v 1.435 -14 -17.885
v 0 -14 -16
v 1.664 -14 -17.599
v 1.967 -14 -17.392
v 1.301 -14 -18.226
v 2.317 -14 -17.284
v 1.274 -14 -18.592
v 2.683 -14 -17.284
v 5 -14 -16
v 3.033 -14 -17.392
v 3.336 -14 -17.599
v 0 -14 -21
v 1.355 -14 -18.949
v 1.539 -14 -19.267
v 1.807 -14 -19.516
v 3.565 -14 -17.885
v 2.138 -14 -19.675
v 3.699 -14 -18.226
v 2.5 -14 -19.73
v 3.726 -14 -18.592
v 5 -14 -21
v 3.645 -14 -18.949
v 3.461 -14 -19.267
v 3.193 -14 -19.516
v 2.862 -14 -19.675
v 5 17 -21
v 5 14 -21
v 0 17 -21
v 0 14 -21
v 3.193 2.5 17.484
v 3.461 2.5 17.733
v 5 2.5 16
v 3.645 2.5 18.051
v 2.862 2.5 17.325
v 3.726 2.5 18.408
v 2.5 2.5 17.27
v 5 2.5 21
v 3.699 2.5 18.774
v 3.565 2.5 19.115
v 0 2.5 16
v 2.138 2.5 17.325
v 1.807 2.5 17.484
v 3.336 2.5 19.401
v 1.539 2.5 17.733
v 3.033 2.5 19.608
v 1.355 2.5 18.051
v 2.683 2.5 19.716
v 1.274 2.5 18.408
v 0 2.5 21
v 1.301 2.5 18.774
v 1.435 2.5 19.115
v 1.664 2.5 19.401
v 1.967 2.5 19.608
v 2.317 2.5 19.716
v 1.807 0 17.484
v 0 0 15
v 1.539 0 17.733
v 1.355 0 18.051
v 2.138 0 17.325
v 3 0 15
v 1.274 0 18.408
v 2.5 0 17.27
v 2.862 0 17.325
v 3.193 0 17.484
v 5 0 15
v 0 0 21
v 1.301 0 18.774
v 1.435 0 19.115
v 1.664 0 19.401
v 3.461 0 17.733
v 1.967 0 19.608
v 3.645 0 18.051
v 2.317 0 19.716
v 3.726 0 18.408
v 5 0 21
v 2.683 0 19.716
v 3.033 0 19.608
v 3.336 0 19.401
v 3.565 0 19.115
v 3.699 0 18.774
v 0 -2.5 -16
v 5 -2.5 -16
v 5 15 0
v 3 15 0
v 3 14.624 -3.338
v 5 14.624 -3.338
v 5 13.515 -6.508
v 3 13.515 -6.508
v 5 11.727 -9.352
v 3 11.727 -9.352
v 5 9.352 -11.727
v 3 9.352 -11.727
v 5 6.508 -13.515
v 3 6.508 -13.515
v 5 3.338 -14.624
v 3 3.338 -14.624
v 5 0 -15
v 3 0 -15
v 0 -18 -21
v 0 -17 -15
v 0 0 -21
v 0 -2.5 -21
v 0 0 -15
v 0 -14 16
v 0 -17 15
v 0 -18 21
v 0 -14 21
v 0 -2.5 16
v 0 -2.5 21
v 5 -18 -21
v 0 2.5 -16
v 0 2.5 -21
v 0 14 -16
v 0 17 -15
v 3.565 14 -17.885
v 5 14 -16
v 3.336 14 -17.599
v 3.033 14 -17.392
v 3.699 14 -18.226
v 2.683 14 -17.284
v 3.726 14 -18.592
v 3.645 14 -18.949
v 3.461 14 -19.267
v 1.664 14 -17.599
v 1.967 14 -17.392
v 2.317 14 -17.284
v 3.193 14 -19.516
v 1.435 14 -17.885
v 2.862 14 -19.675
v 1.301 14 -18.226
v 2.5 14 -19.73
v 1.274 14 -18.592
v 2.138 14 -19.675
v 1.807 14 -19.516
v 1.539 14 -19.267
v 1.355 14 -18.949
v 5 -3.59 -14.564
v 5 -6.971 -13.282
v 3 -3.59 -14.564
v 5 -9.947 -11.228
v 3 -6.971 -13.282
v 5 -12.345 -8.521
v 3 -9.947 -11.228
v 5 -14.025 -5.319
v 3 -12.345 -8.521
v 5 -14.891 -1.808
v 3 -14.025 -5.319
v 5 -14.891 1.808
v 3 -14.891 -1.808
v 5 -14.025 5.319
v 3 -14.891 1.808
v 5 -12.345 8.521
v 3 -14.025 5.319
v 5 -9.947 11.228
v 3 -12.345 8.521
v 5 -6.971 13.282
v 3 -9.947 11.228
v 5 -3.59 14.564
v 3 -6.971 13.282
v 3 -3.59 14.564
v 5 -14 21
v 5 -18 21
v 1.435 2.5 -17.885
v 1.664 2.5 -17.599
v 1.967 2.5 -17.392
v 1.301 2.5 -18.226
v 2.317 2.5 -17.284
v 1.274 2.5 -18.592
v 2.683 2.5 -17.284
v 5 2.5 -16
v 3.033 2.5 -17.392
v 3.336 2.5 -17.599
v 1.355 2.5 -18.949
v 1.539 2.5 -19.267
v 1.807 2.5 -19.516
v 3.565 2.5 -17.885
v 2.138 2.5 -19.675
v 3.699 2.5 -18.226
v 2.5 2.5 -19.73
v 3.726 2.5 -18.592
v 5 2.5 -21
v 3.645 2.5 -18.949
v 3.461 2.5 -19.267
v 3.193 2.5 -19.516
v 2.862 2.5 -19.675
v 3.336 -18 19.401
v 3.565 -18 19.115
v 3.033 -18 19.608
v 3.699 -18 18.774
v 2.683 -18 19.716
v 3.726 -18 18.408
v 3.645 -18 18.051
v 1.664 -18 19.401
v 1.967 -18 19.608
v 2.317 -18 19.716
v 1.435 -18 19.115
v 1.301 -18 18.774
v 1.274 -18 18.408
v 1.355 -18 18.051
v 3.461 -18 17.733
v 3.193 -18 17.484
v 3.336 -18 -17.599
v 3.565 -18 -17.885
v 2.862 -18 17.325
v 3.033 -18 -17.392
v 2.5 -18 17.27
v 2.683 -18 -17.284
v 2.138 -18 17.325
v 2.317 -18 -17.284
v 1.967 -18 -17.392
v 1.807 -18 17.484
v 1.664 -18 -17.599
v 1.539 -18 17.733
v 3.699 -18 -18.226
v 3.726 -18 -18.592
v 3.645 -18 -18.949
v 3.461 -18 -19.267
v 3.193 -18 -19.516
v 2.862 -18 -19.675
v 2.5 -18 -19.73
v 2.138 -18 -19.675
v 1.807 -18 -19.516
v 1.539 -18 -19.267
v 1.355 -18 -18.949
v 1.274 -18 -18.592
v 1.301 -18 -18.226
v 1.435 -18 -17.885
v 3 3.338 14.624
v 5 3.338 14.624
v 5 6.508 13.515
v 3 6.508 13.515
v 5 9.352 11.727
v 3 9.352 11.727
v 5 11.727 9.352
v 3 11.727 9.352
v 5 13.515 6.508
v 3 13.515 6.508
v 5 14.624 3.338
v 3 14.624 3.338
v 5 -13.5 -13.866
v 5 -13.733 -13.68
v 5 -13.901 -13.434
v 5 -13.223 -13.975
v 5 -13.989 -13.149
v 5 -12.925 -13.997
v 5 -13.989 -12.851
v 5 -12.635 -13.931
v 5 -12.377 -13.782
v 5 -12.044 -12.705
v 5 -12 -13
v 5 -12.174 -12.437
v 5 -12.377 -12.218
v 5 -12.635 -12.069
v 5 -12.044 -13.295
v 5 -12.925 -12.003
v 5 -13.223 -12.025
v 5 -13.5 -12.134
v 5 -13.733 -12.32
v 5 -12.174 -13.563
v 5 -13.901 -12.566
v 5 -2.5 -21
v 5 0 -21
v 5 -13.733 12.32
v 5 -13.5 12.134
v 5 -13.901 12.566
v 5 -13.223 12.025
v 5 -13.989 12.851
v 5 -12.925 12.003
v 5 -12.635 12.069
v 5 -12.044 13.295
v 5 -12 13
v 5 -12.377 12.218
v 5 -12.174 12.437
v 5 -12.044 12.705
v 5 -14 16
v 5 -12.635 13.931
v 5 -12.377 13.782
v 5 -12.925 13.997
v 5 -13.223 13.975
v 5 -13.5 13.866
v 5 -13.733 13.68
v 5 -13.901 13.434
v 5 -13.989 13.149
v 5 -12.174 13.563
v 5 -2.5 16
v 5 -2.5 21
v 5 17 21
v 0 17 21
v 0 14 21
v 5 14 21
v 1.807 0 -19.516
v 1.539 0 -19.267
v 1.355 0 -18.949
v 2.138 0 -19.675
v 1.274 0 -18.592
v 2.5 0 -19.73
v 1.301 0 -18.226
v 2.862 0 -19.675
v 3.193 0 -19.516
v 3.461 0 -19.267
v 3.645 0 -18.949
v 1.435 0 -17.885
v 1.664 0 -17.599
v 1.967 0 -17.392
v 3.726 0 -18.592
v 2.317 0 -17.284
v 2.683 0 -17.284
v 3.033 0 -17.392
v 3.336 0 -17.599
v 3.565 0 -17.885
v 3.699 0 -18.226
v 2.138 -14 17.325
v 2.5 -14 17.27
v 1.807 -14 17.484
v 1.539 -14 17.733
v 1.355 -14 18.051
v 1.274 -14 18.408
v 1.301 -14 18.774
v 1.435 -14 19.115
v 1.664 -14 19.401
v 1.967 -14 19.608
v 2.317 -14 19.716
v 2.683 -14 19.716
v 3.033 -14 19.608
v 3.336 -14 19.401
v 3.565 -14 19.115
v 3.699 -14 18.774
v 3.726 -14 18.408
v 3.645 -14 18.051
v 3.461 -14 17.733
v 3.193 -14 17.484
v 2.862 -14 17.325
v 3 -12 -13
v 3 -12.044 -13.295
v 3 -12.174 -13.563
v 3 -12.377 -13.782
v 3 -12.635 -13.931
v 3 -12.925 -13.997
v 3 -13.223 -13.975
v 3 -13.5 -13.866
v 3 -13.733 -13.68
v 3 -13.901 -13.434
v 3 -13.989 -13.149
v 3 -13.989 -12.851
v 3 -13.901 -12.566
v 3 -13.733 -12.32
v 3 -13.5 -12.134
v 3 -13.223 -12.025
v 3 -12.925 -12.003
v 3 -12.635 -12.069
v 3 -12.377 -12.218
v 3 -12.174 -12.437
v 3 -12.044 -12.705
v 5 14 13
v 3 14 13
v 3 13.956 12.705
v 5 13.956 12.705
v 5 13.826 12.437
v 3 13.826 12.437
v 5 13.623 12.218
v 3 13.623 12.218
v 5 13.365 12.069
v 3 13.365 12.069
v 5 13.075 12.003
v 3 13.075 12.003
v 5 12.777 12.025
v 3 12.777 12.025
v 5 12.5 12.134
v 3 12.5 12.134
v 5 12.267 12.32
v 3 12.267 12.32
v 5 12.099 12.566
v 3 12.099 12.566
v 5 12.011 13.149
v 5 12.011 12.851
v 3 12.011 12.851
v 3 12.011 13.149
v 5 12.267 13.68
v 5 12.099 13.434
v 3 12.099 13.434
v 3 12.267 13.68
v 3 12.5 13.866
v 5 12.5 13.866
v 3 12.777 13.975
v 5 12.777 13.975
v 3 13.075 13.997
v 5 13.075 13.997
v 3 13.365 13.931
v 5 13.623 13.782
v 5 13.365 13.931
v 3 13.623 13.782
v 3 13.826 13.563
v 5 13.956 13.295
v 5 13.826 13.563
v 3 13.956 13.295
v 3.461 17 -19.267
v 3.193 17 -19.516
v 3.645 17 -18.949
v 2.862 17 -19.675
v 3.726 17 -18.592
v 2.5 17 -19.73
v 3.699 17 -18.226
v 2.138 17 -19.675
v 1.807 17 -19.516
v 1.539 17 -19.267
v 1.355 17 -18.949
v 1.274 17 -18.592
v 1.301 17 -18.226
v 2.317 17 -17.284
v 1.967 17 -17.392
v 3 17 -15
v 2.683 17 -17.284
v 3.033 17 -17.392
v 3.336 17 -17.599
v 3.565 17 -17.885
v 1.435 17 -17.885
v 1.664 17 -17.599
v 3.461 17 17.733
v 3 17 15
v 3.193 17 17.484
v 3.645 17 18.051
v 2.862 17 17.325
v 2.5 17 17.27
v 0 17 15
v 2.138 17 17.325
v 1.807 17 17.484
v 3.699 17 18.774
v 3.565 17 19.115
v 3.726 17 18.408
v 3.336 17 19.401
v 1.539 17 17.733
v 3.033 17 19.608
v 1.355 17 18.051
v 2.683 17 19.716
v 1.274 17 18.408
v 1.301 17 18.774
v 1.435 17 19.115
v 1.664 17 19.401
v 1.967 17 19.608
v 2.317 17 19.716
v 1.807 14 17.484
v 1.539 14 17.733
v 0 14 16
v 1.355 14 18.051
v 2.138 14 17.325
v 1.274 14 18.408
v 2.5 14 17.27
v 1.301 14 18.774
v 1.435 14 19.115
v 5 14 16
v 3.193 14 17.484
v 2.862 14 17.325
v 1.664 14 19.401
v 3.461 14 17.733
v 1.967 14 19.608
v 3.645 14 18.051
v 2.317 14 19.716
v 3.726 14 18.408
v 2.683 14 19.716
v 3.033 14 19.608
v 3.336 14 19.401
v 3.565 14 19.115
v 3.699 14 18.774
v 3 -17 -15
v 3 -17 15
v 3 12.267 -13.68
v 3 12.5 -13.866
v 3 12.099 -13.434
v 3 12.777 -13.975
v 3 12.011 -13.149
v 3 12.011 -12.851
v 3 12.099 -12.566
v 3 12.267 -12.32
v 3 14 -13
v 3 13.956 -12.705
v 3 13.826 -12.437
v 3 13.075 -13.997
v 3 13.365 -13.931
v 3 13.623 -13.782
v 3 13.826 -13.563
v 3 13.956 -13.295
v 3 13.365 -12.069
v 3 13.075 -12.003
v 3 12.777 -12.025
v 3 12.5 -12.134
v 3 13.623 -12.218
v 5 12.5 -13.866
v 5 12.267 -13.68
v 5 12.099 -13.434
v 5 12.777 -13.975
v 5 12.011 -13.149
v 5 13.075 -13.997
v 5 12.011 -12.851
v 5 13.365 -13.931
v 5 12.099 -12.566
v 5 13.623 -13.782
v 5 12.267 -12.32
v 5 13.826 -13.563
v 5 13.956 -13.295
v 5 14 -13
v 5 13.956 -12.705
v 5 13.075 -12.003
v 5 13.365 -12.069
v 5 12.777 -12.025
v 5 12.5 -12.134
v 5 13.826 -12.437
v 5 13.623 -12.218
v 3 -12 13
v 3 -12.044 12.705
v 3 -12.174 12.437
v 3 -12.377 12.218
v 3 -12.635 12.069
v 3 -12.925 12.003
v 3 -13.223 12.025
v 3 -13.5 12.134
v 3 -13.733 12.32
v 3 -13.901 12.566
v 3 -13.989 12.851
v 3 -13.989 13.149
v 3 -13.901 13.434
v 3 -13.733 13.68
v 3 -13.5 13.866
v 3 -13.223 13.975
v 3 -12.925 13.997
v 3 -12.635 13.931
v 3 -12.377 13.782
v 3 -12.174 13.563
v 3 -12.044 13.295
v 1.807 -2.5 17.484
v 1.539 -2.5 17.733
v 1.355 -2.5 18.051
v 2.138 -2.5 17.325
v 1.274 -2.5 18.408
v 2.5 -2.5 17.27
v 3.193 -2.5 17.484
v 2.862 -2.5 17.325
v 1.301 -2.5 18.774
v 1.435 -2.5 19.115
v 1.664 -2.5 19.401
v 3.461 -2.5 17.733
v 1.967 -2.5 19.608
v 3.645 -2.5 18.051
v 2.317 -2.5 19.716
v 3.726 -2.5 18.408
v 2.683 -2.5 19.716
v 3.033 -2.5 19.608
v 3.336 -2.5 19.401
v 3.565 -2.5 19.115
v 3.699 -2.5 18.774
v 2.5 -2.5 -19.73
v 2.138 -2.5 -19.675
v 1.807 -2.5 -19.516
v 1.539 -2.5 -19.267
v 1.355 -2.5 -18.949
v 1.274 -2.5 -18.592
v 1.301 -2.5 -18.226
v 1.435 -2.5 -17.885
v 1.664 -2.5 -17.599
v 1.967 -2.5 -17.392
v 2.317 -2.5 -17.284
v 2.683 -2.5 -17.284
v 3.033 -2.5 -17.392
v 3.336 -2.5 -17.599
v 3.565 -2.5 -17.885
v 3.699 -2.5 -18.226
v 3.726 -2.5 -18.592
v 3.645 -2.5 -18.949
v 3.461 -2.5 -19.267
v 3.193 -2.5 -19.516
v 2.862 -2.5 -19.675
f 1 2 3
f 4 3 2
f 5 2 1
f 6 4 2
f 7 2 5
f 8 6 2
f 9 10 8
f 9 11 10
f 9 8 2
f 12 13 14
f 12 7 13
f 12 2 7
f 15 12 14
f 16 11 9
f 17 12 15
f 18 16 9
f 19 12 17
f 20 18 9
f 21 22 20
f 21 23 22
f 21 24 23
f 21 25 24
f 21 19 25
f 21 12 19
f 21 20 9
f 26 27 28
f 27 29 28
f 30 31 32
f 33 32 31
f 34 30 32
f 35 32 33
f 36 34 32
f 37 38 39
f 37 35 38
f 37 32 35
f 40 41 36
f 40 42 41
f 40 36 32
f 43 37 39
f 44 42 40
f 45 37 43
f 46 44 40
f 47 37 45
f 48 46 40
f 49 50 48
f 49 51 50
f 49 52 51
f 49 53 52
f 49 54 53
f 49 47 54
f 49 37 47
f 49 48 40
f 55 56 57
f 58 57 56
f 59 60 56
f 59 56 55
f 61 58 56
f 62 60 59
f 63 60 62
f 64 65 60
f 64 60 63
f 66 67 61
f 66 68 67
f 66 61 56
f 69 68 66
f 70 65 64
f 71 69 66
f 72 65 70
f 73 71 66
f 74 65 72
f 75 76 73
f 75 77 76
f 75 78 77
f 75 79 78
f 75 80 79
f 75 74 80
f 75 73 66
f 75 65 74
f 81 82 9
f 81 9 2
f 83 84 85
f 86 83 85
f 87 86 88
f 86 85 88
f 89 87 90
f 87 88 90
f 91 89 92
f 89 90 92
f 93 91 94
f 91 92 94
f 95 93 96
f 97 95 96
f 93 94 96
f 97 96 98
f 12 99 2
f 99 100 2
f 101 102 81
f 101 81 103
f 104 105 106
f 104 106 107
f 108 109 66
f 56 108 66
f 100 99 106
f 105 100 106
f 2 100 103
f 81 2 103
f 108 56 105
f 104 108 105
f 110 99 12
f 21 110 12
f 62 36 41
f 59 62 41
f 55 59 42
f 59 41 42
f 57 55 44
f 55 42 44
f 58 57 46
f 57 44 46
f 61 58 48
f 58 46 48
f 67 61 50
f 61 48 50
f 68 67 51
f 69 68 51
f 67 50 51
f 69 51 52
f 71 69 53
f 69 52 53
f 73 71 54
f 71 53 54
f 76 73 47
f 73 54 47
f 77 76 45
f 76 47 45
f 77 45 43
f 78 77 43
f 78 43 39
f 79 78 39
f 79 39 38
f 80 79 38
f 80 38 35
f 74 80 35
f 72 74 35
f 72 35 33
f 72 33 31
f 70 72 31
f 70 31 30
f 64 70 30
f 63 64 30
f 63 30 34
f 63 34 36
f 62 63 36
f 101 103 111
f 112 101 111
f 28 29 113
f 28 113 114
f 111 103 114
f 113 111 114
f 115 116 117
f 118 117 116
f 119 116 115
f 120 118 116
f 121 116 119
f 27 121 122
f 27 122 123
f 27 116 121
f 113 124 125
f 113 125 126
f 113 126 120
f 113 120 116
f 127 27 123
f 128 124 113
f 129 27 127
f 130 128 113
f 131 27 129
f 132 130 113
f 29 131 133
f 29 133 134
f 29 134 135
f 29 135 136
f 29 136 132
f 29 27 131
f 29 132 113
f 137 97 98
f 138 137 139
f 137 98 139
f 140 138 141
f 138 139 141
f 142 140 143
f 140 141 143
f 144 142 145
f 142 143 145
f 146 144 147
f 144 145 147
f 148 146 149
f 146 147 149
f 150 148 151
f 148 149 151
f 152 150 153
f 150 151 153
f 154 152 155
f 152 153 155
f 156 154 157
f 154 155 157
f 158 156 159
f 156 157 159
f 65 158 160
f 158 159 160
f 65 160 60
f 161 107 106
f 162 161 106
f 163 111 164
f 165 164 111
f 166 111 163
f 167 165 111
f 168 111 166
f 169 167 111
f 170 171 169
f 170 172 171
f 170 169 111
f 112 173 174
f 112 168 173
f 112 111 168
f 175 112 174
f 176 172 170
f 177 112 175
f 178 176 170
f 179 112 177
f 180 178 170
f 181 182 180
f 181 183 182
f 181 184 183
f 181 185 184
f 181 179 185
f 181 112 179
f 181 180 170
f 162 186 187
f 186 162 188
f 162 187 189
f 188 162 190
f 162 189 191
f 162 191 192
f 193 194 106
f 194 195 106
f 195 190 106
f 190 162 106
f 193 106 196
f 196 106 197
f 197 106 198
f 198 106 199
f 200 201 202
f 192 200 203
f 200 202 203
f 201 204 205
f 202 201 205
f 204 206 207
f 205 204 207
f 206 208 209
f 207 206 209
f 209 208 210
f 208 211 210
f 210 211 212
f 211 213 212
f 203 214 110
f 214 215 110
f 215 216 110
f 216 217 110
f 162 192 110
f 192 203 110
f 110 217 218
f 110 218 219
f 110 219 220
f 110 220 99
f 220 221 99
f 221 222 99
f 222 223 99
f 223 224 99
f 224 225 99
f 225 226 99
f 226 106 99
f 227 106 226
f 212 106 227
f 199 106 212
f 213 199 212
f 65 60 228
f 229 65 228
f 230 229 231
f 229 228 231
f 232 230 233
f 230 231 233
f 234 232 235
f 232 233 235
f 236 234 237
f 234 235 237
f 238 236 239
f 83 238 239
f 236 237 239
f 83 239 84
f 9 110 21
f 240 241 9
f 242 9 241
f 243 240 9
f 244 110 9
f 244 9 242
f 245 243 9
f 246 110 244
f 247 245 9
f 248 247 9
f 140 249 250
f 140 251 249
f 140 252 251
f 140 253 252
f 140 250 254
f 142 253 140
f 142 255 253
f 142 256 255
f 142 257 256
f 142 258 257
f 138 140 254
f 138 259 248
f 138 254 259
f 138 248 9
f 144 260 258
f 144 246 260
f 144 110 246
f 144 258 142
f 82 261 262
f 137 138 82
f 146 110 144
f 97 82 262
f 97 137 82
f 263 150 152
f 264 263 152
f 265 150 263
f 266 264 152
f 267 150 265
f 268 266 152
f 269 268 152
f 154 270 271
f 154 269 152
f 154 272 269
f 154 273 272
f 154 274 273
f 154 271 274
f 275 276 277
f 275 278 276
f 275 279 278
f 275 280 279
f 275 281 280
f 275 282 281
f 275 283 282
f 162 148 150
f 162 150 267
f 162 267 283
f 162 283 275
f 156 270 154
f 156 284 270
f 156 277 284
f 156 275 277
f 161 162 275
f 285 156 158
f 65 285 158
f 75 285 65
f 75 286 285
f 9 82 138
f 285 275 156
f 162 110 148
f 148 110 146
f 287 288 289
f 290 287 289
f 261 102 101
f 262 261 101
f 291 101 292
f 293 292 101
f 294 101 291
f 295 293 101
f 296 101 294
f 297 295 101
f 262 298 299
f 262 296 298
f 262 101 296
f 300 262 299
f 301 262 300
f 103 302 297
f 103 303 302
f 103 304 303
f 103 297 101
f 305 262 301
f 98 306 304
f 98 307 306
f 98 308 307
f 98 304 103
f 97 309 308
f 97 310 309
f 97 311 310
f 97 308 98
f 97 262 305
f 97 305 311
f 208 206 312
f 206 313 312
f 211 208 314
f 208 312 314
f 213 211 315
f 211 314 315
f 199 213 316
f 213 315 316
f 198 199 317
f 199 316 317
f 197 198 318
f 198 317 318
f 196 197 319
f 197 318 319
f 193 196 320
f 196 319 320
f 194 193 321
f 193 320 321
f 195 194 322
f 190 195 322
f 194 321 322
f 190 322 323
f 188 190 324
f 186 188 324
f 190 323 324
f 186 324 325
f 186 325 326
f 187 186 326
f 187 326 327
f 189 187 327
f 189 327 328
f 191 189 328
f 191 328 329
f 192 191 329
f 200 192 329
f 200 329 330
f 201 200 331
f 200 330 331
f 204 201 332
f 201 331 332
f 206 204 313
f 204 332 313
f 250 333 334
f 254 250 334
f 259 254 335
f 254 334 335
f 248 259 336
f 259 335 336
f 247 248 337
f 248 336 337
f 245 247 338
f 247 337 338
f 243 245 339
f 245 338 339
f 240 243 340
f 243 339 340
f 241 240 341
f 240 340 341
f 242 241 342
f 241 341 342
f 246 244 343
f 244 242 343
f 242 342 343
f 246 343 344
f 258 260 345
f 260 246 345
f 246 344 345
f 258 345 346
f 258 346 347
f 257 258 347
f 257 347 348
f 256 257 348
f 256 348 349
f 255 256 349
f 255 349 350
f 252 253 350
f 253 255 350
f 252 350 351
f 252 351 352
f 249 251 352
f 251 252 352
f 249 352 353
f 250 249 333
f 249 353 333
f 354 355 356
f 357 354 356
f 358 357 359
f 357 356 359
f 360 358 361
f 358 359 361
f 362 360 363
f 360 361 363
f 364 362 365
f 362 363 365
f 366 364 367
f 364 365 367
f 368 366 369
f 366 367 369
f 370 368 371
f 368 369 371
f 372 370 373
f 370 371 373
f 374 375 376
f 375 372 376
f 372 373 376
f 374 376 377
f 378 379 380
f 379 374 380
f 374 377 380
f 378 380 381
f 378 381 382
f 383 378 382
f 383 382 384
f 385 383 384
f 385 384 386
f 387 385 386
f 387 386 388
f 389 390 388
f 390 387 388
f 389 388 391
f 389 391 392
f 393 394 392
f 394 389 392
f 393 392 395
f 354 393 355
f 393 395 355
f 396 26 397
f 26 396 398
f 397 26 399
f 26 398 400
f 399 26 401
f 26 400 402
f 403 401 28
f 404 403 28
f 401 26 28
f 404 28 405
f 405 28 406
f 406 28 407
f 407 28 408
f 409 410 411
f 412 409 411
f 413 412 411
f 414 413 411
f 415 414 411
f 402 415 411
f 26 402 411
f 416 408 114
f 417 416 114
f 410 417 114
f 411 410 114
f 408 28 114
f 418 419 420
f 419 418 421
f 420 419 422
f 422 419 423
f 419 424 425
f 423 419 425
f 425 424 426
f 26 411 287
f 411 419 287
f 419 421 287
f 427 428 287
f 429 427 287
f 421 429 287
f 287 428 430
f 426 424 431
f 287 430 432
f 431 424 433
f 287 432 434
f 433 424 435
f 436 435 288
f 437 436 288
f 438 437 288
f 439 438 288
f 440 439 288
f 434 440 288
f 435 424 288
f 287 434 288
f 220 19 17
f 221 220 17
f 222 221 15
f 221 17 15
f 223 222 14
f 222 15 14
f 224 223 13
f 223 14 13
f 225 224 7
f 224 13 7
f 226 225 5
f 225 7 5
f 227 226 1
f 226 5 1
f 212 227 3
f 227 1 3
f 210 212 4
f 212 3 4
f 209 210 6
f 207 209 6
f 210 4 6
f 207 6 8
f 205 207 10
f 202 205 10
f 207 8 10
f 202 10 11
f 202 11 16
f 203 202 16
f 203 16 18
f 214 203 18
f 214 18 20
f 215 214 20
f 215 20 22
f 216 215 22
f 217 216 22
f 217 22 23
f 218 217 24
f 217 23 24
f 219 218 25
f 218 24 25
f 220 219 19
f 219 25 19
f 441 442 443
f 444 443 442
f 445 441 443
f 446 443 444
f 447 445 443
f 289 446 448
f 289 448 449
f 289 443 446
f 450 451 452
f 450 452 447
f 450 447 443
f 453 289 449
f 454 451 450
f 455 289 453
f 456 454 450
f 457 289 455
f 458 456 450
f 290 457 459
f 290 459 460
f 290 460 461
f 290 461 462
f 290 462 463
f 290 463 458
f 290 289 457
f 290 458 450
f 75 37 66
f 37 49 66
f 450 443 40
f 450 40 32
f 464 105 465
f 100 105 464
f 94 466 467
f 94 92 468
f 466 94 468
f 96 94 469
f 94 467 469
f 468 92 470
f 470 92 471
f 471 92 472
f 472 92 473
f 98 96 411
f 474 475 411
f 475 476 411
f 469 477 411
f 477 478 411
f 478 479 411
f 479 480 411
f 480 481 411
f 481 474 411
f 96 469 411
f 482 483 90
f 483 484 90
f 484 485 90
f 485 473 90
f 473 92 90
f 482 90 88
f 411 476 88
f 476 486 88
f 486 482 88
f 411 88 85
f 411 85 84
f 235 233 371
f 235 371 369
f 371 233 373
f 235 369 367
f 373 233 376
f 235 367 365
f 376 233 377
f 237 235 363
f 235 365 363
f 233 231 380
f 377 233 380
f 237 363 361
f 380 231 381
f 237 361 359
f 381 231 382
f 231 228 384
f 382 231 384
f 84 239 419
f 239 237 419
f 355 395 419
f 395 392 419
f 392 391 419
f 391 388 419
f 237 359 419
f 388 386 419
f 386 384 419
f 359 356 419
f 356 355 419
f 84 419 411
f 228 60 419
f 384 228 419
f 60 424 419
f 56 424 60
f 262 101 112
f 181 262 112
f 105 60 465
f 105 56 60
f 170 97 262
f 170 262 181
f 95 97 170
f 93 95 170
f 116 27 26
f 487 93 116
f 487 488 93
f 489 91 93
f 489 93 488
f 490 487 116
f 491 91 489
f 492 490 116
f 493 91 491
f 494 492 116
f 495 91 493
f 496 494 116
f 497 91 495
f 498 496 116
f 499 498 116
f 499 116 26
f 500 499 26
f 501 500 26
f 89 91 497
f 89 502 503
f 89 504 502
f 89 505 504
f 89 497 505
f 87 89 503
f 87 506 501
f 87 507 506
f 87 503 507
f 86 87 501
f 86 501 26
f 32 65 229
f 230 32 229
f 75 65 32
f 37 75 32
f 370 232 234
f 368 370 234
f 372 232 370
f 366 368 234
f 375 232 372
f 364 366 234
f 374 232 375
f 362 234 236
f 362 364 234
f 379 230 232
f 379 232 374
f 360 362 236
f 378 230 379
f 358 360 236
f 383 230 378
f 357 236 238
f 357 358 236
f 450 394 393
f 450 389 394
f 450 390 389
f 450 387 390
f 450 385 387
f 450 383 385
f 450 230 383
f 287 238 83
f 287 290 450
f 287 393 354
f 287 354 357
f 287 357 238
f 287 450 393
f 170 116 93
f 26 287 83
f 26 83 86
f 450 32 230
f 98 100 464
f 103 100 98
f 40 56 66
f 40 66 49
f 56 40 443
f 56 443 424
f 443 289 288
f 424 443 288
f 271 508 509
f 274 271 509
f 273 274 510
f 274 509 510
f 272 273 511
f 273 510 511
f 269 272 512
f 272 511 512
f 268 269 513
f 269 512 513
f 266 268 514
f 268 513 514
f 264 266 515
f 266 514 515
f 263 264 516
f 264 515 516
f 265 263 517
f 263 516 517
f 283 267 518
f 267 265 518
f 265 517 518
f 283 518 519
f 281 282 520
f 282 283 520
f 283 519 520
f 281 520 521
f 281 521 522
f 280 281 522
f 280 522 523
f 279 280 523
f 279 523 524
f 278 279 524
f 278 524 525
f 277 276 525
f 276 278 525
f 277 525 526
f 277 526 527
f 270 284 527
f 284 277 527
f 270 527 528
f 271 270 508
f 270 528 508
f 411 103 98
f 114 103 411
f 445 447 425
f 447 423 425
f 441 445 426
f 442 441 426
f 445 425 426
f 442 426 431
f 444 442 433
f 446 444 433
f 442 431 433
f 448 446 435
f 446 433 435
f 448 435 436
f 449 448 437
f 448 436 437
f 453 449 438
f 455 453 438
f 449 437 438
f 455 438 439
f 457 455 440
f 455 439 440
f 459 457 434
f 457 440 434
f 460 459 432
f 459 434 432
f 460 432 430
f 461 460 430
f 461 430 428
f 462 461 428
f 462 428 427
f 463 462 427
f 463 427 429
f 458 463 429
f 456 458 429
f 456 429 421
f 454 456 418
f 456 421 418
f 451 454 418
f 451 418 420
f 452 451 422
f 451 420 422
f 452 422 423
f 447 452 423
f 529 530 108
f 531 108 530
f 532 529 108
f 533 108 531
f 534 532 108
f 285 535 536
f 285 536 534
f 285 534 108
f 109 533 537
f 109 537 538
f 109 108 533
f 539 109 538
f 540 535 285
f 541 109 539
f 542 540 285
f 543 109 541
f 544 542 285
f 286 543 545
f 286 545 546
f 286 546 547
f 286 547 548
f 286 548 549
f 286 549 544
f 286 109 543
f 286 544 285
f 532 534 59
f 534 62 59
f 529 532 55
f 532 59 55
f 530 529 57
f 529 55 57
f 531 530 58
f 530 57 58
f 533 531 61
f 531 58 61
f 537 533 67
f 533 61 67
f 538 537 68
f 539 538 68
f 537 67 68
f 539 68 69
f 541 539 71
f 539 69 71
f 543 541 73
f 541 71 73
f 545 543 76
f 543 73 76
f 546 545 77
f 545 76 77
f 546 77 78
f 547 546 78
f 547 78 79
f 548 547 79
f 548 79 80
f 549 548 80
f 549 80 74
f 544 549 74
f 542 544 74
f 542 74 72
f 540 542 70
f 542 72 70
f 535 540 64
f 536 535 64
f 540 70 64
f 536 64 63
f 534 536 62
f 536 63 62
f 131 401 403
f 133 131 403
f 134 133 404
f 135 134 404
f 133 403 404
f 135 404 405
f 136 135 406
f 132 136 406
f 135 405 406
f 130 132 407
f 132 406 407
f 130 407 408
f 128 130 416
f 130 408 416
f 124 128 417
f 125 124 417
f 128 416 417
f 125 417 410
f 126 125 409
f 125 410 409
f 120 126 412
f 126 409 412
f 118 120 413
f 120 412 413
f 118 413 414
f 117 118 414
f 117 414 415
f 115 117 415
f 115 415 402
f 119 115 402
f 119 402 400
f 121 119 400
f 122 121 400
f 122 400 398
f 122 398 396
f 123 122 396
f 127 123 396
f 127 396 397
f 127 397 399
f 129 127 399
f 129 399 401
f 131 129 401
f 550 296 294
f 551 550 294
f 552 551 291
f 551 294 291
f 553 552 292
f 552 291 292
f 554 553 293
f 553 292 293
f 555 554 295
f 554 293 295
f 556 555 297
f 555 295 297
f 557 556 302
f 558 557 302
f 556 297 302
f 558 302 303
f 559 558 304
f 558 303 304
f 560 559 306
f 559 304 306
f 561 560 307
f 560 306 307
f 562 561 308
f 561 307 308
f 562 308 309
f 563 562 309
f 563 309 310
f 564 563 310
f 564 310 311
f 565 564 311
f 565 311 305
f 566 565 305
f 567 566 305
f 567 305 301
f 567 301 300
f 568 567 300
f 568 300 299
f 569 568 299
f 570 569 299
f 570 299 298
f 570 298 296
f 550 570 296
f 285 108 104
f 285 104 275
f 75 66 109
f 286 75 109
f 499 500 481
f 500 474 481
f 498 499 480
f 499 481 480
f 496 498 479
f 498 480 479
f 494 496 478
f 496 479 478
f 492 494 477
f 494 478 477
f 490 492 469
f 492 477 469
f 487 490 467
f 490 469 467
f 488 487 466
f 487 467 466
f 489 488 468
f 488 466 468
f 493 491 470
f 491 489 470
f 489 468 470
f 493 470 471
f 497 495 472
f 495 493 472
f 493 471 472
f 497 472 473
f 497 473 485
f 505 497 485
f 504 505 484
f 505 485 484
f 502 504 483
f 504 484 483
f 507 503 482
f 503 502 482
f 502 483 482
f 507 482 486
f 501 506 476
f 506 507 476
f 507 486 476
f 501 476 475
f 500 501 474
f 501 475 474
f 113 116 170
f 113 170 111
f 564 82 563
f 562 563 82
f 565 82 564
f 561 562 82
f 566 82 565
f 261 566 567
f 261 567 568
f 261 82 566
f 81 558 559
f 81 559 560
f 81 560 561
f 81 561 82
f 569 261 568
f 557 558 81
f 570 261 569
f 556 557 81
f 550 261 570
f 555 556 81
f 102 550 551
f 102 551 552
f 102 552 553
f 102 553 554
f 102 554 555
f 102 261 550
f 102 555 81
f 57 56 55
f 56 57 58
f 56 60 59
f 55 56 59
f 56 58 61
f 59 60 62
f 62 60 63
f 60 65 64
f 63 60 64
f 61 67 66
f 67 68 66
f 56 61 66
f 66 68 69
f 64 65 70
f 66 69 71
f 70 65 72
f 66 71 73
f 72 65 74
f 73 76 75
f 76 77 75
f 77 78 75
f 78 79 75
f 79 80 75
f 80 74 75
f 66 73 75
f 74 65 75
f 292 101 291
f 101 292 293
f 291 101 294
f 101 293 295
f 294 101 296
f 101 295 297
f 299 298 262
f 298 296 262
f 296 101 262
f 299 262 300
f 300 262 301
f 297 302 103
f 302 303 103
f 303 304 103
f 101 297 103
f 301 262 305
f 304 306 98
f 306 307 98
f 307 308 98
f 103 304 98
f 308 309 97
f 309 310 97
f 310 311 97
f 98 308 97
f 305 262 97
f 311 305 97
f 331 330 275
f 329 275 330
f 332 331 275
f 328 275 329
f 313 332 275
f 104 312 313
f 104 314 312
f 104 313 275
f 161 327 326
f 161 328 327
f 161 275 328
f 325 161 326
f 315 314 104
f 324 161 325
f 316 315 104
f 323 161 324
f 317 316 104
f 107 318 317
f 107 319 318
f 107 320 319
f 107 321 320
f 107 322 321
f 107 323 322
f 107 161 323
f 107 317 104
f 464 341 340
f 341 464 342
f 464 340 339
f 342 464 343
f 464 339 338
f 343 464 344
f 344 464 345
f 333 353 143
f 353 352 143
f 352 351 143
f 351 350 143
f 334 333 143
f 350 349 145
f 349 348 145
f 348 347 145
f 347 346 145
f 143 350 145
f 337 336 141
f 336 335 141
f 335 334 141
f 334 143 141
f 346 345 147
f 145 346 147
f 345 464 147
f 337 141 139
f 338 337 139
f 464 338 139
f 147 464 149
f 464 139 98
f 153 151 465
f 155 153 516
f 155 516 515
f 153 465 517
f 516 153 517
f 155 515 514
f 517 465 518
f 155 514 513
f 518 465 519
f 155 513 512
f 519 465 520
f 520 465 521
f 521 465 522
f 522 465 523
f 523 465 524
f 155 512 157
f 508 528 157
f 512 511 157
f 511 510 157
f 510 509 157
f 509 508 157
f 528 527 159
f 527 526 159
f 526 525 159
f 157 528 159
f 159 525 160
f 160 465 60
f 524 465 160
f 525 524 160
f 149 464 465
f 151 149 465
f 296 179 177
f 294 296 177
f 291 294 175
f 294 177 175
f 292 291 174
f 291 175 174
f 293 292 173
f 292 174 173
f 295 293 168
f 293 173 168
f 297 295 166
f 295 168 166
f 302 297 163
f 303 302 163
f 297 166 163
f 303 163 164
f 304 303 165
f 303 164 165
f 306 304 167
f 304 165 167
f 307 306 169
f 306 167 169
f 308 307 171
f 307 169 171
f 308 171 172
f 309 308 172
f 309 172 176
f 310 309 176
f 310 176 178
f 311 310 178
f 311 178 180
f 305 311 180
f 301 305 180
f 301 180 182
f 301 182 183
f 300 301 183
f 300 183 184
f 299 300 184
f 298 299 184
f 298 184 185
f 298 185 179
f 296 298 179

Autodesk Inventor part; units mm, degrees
ref_plane "YZ Plane" through (0, 0, 0) normal (1, 0, 0) x (0, 1, 0)
ref_plane "XZ Plane" through (0, 0, 0) normal (0, 1, 0) x (-1, 0, 0)
ref_plane "XY Plane" through (0, 0, 0) normal (0, 0, 1) x (1, 0, 0)
sketch "Sketch1" plane through (0, 0, 0) normal (1, 0, 0) x (0, 1, 0)
  circle A0 centre (0, 0) radius 15
  line L0 (15, 15) -> (-15, 15)
  line L1 (-15, 15) -> (-15, -15) construction
  line L2 (-15, -15) -> (15, -15)
  line L3 (15, -15) -> (15, 15) construction
  line L4 (15, 15) -> (-15, -15) construction
  line L5 (-15, 15) -> (15, -15) construction
  line L6 (17, 21) -> (-17, 21)
  line L7 (-17, 21) -> (-17, -21)
  line L8 (-17, -21) -> (17, -21)
  line L9 (17, -21) -> (17, 21)
  line L10 (17, 21) -> (-17, -21) construction
  line L11 (-17, 21) -> (17, -21) construction
  circle A1 centre (13, -13) radius 1
  circle A2 centre (13, 13) radius 1
  circle A3 centre (-13, -13) radius 1
  circle A4 centre (-13, 13) radius 1
  line L12 (17, -15) -> (15, -15)
  line L13 (-15, -15) -> (-17, -15)
  line L14 (17, 15) -> (15, 15)
  line L15 (-15, 15) -> (-17, 15)
  line L16 (-17, 21) -> (-18, 21)
  line L17 (-18, 21) -> (-18, -21)
  line L18 (-18, -21) -> (-17, -21)
  line L19 (-17, -21) -> (-17, 21)
  point P0 (0, -15)
  point P1 (0, 15)
  dimension "d0" = 30
  dimension "d1" = 42
  dimension "d2" = 34
  dimension "d10" = 2
  dimension "d11" = 2
  dimension "d14" = 26
  dimension "d17" = 26
  dimension "d44" = 1
sketch "Sketch2" plane through (0, 0, 0) normal (0, 1, 0) x (-1, 0, 0)
  line L0 (190, 50) -> (-10, 50)
  line L1 (-10, 50) -> (-10, -50)
  line L2 (-10, -50) -> (190, -50)
  line L3 (190, -50) -> (190, 50)
  point P0 (0, 0)
  point P1 (-10, 0)
  dimension "d3" = 200
  dimension "d4" = 100
  dimension "d5" = 10
extrude "Extrusion1" add sketch "Sketch1" along normal blind 5 contours A0 | A0 L0 L14 L9 L12 L2 | L0 L15 L7 L6 L9 L14 | A0 L2 L13 L7 L15 L0 | L2 L12 L9 L8 L7 L13 | A1 | A2 | A3 | A4
extrude "Extrusion4" cut sketch "Sketch1" along normal blind 3 contours A0 L0 L14 L9 L12 L2 | A0 L2 L13 L7 L15 L0
extrude "Extrusion3" cut sketch "Sketch1" along normal blind 5 contours A0 | A1 | A2 | A3 | A4
sketch "Sketch3" plane through (0, -17, 21) normal (0, 0, 1) x (1, 0, 0)
  line L0 (0, 34) -> (0, 0) projected
  line L1 (0, 0) -> (5, 0) projected
  line L2 (5, 34) -> (5, 0) projected
  line L3 (0, 0) -> (0, 34) projected
  line L4 (5, 0) -> (5, 34) projected
  line L5 (0, 14.5) -> (5, 14.5)
  line L6 (5, 14.5) -> (5, 3)
  line L7 (5, 3) -> (0, 3)
  line L8 (0, 3) -> (0, 14.5)
  line L9 (0, 31) -> (5, 31)
  line L10 (5, 31) -> (5, 19.5)
  line L11 (5, 19.5) -> (0, 19.5)
  line L12 (0, 19.5) -> (0, 31)
  line L13 (0, 34) -> (5, 34) projected
  point P0 (0, 17)
  point P1 (0, 17)
  point P2 (0, 3)
  point P3 (5, 3)
  point P4 (0, 19.5)
  dimension "d26" = 3
  dimension "d27" = 5
  dimension "d29" = 2.5
  dimension "d43" = 3
extrude "Extrusion5" cut sketch "Sketch3" against normal blind 5 contours L9 L2 L11 L0 | L5 L2 L7 L0
mirror "Mirror1" about plane through (0, 0, 0) normal (0, 0, 1) of "Extrusion5"
extrude "Extrusion6" add sketch "Sketch1" along normal blind 5 contours L7 L18 L17 L16
sketch "Sketch5" plane through (0, -18, -21) normal (0, -1, 0) x (1, 0, 0)
  line L0 (0, 42) -> (5, 42) projected
  line L1 (0, 42) -> (0, 0) projected
  line L2 (0, 0) -> (5, 0) projected
  point P0 (0, 21)
  point P1 (2.5, 2.5)
  point P2 (2.5, 39.5)
  dimension "d54" = 2.5
  dimension "d55" = 2.5
  dimension "d56" = 2.5
  dimension "d57" = 2.5
hole "Hole2" at (2.5, -18, -18.5) at (2.5, -18, 18.5) direction (0, 1, 0) diameter 2.459 end through all thread size "M3x0.5" class "6H" standard "ISO Metric profile"
split body "Split1" result two bodies by plane through (0, 0, 0) normal (0, 1, 0) first body at (4.5, 16.3333, 0)
properties part number "Camera holder1"
